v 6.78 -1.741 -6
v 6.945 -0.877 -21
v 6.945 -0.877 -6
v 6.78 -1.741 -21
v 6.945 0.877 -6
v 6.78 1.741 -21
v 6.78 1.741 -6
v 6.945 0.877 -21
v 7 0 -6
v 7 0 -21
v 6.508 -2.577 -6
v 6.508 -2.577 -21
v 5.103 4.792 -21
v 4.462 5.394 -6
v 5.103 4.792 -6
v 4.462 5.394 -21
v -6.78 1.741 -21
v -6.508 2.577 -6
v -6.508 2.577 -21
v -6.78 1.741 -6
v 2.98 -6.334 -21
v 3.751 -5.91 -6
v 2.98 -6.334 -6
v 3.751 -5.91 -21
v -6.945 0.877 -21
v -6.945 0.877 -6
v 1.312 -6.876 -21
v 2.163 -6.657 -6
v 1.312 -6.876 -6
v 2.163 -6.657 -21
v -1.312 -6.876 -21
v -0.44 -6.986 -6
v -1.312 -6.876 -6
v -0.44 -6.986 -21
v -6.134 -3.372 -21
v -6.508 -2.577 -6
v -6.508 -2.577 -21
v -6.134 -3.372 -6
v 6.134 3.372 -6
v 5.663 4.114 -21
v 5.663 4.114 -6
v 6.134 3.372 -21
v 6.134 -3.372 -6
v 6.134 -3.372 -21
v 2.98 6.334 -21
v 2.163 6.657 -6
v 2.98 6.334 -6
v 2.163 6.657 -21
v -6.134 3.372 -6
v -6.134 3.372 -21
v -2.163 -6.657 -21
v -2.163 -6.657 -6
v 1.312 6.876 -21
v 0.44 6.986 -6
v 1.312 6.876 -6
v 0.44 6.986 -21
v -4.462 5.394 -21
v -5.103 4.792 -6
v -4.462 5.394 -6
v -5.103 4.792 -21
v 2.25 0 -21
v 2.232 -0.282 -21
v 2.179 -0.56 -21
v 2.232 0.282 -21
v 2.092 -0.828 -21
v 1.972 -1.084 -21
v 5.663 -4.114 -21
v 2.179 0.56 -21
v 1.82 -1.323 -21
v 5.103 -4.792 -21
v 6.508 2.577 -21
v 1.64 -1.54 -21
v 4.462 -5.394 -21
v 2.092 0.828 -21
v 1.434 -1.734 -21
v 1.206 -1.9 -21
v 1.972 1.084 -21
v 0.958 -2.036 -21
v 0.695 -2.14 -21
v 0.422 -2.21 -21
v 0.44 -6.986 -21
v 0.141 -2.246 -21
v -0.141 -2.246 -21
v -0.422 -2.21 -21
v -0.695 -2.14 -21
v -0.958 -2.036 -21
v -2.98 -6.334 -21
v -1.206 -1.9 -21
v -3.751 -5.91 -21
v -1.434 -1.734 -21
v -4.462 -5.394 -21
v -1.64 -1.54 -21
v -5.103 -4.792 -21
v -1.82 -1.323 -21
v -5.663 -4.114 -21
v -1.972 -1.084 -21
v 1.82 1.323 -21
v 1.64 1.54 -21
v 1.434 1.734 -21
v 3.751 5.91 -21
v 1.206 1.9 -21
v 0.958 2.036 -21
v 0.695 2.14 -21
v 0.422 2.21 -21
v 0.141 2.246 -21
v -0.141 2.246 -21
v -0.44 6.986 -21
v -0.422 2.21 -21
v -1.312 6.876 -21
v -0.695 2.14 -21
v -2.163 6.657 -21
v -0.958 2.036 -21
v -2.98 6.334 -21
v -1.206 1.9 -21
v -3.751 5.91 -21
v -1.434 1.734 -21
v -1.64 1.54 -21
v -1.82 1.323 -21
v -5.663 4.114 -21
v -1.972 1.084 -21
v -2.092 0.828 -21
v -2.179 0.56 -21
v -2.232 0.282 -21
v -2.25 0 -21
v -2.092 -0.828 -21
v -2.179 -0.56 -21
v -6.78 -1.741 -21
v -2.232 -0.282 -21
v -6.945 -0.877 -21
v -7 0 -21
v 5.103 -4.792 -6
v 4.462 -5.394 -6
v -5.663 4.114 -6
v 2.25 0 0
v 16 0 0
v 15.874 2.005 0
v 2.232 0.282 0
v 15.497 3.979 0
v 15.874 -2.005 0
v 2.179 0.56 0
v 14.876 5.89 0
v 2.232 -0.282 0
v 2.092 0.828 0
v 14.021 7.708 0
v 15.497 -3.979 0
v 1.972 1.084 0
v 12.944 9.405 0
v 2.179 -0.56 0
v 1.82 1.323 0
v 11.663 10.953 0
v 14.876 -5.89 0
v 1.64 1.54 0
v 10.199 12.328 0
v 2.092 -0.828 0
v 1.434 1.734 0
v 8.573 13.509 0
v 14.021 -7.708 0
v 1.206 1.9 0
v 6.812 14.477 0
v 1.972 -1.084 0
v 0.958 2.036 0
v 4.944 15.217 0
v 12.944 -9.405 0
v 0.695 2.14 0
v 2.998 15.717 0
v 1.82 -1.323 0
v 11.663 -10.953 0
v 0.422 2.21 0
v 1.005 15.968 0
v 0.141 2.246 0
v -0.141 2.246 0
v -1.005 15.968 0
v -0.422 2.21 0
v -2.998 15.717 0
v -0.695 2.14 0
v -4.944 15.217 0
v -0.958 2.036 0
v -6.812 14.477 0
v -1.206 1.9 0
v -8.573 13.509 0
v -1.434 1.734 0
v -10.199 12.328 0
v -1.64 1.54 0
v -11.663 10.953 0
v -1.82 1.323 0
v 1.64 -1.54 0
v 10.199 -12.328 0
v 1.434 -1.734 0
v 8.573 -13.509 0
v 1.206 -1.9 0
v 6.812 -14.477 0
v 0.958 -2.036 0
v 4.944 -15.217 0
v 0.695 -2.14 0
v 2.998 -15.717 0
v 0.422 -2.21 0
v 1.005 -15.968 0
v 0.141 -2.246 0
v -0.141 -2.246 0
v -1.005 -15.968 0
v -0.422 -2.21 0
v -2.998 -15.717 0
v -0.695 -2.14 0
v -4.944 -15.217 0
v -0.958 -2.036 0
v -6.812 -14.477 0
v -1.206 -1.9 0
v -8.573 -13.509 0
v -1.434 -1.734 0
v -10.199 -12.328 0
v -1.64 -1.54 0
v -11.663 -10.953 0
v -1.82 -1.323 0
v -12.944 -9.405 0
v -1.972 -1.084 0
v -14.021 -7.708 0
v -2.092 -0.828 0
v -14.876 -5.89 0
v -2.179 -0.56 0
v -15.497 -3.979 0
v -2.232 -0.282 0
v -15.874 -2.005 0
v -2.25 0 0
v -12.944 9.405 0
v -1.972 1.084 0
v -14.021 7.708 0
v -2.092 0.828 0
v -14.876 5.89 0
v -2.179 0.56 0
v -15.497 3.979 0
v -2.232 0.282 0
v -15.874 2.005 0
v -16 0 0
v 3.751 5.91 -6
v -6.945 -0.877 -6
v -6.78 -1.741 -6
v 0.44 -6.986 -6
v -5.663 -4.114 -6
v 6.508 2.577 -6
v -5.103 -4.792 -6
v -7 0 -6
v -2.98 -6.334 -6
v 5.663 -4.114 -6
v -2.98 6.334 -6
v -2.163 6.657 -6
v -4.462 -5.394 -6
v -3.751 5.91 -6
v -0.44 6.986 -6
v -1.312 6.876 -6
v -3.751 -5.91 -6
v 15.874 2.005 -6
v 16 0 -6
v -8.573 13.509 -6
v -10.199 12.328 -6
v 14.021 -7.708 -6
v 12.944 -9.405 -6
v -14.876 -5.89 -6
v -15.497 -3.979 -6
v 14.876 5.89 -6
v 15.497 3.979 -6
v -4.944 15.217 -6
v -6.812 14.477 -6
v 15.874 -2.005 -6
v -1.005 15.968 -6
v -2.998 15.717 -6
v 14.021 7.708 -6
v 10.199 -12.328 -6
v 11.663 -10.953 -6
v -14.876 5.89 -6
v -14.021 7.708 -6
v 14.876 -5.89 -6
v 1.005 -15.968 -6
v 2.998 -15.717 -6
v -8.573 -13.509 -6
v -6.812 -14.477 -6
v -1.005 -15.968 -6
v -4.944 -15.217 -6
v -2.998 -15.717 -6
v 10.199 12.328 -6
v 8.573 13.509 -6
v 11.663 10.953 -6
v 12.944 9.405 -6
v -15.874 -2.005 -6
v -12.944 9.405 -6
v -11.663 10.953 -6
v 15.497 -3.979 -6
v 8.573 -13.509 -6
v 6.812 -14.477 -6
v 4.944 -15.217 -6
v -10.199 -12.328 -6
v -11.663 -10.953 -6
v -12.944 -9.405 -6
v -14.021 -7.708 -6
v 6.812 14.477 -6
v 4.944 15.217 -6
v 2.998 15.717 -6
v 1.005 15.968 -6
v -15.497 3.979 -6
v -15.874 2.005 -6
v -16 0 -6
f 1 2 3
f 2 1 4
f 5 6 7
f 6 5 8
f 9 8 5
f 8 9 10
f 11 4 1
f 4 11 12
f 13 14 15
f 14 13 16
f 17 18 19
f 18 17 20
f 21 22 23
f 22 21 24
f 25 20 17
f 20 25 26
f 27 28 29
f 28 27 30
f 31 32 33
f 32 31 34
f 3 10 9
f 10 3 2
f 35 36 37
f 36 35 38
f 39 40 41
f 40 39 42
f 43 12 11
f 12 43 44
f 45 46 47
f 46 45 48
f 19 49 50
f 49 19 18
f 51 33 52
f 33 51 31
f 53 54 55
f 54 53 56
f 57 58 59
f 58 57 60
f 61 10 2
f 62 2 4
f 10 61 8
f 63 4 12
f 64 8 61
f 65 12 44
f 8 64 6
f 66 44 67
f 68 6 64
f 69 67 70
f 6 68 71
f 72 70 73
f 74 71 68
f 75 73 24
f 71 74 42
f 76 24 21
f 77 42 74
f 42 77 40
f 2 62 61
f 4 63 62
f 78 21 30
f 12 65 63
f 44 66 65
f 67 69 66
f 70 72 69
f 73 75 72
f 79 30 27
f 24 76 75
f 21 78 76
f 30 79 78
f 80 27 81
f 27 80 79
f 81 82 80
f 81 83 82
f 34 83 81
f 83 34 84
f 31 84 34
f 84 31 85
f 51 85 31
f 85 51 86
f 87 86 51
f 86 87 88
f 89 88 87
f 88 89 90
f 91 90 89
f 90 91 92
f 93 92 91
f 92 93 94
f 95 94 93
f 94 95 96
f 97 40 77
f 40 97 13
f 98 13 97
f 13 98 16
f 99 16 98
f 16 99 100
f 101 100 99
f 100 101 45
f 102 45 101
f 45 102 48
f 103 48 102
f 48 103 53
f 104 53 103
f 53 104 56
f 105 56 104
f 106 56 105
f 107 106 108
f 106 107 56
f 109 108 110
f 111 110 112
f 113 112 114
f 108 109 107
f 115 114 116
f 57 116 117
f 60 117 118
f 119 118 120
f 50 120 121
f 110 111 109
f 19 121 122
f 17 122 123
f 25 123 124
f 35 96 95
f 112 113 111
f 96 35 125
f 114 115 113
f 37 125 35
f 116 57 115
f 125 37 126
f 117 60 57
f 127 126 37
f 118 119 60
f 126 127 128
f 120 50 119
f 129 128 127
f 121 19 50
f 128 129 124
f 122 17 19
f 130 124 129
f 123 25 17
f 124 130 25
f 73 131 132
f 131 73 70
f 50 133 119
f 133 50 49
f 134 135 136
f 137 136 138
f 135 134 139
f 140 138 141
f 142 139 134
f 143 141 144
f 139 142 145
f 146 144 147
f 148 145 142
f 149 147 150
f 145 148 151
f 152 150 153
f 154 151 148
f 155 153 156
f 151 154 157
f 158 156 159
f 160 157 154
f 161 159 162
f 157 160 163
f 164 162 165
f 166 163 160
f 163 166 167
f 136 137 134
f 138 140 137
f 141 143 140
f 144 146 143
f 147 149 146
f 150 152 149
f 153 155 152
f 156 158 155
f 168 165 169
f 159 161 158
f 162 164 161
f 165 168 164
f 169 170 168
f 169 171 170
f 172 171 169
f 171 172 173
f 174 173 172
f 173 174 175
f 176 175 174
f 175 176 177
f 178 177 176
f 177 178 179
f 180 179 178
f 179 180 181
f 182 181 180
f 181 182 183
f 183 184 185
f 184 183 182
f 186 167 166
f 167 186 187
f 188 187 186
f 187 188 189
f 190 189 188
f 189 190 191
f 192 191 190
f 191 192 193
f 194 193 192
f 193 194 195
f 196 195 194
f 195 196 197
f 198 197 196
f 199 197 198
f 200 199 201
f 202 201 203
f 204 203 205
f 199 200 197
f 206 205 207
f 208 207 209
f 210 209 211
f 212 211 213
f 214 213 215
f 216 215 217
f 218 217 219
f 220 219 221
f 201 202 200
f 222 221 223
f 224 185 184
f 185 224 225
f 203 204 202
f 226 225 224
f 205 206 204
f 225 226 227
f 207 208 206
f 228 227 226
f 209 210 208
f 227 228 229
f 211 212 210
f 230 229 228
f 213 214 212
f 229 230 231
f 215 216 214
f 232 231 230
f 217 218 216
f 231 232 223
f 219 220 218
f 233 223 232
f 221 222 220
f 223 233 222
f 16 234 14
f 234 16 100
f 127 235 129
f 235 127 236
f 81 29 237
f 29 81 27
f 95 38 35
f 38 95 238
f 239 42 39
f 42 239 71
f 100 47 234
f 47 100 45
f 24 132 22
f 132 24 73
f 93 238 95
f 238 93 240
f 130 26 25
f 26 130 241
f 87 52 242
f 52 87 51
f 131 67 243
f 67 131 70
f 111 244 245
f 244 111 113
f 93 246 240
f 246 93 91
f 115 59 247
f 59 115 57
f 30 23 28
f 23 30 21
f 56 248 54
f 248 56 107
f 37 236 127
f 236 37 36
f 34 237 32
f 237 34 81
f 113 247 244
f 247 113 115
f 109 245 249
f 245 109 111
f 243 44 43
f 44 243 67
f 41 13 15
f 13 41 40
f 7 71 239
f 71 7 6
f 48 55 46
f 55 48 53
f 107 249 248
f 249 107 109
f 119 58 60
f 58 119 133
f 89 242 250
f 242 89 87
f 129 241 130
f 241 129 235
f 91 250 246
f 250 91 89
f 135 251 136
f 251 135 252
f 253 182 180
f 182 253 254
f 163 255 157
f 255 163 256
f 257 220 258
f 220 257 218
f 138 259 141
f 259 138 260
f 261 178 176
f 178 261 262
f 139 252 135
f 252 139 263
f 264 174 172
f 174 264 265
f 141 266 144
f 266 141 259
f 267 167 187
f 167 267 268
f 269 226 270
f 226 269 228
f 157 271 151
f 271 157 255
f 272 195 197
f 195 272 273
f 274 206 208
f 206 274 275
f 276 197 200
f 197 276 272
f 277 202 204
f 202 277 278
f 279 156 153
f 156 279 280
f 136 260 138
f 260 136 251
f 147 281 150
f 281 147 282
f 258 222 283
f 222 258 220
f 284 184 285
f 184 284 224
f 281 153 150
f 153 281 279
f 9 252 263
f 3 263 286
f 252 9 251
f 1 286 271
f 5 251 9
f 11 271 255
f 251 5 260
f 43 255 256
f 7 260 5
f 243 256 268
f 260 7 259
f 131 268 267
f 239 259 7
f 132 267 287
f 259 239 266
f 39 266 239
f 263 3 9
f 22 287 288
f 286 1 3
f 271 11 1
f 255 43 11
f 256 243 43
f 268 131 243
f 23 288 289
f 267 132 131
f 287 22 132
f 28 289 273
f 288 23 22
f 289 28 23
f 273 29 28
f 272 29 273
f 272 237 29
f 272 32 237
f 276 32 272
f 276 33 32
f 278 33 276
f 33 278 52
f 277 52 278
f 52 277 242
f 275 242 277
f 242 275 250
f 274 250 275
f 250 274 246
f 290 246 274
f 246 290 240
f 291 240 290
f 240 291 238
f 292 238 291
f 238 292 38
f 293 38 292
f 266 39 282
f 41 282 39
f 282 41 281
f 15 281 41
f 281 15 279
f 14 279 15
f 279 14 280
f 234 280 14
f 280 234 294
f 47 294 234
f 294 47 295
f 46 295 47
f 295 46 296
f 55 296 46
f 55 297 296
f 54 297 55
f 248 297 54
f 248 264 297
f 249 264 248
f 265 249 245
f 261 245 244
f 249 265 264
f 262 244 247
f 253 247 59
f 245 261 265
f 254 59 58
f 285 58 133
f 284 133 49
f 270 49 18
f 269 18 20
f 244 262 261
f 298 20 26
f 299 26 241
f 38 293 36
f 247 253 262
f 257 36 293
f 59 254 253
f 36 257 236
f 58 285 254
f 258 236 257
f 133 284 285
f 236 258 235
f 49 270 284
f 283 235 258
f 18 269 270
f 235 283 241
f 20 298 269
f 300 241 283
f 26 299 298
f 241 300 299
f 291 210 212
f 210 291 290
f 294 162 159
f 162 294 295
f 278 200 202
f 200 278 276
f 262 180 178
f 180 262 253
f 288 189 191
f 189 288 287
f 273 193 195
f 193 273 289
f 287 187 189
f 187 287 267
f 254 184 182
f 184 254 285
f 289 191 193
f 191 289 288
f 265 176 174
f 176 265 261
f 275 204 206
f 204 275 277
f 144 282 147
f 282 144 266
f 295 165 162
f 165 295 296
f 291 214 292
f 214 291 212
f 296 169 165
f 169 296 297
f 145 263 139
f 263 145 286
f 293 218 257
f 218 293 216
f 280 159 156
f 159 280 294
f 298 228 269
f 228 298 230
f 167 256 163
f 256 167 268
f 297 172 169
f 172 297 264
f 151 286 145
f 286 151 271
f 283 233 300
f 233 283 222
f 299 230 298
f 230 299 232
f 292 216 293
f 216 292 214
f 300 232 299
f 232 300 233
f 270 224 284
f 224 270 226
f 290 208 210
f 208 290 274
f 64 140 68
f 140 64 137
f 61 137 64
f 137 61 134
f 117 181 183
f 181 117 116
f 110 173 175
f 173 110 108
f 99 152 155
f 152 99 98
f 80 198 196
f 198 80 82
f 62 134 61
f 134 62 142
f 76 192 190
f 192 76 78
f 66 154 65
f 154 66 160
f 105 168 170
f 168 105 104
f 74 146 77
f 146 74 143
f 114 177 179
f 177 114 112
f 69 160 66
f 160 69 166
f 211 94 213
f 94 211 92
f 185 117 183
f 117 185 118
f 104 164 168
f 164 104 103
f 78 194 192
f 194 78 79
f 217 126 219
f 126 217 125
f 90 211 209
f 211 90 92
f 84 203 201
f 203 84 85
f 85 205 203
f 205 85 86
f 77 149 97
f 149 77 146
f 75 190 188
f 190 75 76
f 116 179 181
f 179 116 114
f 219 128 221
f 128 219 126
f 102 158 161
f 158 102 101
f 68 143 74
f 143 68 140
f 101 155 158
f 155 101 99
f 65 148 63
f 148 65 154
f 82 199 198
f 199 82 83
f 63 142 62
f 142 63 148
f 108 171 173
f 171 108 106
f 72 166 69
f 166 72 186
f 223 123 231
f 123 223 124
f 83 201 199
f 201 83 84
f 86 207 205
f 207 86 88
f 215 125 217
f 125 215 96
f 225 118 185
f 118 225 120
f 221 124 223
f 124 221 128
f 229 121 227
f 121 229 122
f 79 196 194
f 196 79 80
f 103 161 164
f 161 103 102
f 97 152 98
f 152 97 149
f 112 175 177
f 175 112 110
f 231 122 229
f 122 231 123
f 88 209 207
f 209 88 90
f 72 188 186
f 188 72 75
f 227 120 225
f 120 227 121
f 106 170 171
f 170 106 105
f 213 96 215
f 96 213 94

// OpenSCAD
$fn = 50;


difference() {
	union() {
		translate(v = [0, 0, -21.0000000000]) {
			cylinder(h = 21, r = 7.0000000000);
		}
		translate(v = [0, 0, -6.0000000000]) {
			cylinder(h = 6, r = 16.0000000000);
		}
	}
	union() {
		#translate(v = [0, 0, -21]) {
			cylinder(h = 21, r = 2.2500000000);
		}
	}
}
